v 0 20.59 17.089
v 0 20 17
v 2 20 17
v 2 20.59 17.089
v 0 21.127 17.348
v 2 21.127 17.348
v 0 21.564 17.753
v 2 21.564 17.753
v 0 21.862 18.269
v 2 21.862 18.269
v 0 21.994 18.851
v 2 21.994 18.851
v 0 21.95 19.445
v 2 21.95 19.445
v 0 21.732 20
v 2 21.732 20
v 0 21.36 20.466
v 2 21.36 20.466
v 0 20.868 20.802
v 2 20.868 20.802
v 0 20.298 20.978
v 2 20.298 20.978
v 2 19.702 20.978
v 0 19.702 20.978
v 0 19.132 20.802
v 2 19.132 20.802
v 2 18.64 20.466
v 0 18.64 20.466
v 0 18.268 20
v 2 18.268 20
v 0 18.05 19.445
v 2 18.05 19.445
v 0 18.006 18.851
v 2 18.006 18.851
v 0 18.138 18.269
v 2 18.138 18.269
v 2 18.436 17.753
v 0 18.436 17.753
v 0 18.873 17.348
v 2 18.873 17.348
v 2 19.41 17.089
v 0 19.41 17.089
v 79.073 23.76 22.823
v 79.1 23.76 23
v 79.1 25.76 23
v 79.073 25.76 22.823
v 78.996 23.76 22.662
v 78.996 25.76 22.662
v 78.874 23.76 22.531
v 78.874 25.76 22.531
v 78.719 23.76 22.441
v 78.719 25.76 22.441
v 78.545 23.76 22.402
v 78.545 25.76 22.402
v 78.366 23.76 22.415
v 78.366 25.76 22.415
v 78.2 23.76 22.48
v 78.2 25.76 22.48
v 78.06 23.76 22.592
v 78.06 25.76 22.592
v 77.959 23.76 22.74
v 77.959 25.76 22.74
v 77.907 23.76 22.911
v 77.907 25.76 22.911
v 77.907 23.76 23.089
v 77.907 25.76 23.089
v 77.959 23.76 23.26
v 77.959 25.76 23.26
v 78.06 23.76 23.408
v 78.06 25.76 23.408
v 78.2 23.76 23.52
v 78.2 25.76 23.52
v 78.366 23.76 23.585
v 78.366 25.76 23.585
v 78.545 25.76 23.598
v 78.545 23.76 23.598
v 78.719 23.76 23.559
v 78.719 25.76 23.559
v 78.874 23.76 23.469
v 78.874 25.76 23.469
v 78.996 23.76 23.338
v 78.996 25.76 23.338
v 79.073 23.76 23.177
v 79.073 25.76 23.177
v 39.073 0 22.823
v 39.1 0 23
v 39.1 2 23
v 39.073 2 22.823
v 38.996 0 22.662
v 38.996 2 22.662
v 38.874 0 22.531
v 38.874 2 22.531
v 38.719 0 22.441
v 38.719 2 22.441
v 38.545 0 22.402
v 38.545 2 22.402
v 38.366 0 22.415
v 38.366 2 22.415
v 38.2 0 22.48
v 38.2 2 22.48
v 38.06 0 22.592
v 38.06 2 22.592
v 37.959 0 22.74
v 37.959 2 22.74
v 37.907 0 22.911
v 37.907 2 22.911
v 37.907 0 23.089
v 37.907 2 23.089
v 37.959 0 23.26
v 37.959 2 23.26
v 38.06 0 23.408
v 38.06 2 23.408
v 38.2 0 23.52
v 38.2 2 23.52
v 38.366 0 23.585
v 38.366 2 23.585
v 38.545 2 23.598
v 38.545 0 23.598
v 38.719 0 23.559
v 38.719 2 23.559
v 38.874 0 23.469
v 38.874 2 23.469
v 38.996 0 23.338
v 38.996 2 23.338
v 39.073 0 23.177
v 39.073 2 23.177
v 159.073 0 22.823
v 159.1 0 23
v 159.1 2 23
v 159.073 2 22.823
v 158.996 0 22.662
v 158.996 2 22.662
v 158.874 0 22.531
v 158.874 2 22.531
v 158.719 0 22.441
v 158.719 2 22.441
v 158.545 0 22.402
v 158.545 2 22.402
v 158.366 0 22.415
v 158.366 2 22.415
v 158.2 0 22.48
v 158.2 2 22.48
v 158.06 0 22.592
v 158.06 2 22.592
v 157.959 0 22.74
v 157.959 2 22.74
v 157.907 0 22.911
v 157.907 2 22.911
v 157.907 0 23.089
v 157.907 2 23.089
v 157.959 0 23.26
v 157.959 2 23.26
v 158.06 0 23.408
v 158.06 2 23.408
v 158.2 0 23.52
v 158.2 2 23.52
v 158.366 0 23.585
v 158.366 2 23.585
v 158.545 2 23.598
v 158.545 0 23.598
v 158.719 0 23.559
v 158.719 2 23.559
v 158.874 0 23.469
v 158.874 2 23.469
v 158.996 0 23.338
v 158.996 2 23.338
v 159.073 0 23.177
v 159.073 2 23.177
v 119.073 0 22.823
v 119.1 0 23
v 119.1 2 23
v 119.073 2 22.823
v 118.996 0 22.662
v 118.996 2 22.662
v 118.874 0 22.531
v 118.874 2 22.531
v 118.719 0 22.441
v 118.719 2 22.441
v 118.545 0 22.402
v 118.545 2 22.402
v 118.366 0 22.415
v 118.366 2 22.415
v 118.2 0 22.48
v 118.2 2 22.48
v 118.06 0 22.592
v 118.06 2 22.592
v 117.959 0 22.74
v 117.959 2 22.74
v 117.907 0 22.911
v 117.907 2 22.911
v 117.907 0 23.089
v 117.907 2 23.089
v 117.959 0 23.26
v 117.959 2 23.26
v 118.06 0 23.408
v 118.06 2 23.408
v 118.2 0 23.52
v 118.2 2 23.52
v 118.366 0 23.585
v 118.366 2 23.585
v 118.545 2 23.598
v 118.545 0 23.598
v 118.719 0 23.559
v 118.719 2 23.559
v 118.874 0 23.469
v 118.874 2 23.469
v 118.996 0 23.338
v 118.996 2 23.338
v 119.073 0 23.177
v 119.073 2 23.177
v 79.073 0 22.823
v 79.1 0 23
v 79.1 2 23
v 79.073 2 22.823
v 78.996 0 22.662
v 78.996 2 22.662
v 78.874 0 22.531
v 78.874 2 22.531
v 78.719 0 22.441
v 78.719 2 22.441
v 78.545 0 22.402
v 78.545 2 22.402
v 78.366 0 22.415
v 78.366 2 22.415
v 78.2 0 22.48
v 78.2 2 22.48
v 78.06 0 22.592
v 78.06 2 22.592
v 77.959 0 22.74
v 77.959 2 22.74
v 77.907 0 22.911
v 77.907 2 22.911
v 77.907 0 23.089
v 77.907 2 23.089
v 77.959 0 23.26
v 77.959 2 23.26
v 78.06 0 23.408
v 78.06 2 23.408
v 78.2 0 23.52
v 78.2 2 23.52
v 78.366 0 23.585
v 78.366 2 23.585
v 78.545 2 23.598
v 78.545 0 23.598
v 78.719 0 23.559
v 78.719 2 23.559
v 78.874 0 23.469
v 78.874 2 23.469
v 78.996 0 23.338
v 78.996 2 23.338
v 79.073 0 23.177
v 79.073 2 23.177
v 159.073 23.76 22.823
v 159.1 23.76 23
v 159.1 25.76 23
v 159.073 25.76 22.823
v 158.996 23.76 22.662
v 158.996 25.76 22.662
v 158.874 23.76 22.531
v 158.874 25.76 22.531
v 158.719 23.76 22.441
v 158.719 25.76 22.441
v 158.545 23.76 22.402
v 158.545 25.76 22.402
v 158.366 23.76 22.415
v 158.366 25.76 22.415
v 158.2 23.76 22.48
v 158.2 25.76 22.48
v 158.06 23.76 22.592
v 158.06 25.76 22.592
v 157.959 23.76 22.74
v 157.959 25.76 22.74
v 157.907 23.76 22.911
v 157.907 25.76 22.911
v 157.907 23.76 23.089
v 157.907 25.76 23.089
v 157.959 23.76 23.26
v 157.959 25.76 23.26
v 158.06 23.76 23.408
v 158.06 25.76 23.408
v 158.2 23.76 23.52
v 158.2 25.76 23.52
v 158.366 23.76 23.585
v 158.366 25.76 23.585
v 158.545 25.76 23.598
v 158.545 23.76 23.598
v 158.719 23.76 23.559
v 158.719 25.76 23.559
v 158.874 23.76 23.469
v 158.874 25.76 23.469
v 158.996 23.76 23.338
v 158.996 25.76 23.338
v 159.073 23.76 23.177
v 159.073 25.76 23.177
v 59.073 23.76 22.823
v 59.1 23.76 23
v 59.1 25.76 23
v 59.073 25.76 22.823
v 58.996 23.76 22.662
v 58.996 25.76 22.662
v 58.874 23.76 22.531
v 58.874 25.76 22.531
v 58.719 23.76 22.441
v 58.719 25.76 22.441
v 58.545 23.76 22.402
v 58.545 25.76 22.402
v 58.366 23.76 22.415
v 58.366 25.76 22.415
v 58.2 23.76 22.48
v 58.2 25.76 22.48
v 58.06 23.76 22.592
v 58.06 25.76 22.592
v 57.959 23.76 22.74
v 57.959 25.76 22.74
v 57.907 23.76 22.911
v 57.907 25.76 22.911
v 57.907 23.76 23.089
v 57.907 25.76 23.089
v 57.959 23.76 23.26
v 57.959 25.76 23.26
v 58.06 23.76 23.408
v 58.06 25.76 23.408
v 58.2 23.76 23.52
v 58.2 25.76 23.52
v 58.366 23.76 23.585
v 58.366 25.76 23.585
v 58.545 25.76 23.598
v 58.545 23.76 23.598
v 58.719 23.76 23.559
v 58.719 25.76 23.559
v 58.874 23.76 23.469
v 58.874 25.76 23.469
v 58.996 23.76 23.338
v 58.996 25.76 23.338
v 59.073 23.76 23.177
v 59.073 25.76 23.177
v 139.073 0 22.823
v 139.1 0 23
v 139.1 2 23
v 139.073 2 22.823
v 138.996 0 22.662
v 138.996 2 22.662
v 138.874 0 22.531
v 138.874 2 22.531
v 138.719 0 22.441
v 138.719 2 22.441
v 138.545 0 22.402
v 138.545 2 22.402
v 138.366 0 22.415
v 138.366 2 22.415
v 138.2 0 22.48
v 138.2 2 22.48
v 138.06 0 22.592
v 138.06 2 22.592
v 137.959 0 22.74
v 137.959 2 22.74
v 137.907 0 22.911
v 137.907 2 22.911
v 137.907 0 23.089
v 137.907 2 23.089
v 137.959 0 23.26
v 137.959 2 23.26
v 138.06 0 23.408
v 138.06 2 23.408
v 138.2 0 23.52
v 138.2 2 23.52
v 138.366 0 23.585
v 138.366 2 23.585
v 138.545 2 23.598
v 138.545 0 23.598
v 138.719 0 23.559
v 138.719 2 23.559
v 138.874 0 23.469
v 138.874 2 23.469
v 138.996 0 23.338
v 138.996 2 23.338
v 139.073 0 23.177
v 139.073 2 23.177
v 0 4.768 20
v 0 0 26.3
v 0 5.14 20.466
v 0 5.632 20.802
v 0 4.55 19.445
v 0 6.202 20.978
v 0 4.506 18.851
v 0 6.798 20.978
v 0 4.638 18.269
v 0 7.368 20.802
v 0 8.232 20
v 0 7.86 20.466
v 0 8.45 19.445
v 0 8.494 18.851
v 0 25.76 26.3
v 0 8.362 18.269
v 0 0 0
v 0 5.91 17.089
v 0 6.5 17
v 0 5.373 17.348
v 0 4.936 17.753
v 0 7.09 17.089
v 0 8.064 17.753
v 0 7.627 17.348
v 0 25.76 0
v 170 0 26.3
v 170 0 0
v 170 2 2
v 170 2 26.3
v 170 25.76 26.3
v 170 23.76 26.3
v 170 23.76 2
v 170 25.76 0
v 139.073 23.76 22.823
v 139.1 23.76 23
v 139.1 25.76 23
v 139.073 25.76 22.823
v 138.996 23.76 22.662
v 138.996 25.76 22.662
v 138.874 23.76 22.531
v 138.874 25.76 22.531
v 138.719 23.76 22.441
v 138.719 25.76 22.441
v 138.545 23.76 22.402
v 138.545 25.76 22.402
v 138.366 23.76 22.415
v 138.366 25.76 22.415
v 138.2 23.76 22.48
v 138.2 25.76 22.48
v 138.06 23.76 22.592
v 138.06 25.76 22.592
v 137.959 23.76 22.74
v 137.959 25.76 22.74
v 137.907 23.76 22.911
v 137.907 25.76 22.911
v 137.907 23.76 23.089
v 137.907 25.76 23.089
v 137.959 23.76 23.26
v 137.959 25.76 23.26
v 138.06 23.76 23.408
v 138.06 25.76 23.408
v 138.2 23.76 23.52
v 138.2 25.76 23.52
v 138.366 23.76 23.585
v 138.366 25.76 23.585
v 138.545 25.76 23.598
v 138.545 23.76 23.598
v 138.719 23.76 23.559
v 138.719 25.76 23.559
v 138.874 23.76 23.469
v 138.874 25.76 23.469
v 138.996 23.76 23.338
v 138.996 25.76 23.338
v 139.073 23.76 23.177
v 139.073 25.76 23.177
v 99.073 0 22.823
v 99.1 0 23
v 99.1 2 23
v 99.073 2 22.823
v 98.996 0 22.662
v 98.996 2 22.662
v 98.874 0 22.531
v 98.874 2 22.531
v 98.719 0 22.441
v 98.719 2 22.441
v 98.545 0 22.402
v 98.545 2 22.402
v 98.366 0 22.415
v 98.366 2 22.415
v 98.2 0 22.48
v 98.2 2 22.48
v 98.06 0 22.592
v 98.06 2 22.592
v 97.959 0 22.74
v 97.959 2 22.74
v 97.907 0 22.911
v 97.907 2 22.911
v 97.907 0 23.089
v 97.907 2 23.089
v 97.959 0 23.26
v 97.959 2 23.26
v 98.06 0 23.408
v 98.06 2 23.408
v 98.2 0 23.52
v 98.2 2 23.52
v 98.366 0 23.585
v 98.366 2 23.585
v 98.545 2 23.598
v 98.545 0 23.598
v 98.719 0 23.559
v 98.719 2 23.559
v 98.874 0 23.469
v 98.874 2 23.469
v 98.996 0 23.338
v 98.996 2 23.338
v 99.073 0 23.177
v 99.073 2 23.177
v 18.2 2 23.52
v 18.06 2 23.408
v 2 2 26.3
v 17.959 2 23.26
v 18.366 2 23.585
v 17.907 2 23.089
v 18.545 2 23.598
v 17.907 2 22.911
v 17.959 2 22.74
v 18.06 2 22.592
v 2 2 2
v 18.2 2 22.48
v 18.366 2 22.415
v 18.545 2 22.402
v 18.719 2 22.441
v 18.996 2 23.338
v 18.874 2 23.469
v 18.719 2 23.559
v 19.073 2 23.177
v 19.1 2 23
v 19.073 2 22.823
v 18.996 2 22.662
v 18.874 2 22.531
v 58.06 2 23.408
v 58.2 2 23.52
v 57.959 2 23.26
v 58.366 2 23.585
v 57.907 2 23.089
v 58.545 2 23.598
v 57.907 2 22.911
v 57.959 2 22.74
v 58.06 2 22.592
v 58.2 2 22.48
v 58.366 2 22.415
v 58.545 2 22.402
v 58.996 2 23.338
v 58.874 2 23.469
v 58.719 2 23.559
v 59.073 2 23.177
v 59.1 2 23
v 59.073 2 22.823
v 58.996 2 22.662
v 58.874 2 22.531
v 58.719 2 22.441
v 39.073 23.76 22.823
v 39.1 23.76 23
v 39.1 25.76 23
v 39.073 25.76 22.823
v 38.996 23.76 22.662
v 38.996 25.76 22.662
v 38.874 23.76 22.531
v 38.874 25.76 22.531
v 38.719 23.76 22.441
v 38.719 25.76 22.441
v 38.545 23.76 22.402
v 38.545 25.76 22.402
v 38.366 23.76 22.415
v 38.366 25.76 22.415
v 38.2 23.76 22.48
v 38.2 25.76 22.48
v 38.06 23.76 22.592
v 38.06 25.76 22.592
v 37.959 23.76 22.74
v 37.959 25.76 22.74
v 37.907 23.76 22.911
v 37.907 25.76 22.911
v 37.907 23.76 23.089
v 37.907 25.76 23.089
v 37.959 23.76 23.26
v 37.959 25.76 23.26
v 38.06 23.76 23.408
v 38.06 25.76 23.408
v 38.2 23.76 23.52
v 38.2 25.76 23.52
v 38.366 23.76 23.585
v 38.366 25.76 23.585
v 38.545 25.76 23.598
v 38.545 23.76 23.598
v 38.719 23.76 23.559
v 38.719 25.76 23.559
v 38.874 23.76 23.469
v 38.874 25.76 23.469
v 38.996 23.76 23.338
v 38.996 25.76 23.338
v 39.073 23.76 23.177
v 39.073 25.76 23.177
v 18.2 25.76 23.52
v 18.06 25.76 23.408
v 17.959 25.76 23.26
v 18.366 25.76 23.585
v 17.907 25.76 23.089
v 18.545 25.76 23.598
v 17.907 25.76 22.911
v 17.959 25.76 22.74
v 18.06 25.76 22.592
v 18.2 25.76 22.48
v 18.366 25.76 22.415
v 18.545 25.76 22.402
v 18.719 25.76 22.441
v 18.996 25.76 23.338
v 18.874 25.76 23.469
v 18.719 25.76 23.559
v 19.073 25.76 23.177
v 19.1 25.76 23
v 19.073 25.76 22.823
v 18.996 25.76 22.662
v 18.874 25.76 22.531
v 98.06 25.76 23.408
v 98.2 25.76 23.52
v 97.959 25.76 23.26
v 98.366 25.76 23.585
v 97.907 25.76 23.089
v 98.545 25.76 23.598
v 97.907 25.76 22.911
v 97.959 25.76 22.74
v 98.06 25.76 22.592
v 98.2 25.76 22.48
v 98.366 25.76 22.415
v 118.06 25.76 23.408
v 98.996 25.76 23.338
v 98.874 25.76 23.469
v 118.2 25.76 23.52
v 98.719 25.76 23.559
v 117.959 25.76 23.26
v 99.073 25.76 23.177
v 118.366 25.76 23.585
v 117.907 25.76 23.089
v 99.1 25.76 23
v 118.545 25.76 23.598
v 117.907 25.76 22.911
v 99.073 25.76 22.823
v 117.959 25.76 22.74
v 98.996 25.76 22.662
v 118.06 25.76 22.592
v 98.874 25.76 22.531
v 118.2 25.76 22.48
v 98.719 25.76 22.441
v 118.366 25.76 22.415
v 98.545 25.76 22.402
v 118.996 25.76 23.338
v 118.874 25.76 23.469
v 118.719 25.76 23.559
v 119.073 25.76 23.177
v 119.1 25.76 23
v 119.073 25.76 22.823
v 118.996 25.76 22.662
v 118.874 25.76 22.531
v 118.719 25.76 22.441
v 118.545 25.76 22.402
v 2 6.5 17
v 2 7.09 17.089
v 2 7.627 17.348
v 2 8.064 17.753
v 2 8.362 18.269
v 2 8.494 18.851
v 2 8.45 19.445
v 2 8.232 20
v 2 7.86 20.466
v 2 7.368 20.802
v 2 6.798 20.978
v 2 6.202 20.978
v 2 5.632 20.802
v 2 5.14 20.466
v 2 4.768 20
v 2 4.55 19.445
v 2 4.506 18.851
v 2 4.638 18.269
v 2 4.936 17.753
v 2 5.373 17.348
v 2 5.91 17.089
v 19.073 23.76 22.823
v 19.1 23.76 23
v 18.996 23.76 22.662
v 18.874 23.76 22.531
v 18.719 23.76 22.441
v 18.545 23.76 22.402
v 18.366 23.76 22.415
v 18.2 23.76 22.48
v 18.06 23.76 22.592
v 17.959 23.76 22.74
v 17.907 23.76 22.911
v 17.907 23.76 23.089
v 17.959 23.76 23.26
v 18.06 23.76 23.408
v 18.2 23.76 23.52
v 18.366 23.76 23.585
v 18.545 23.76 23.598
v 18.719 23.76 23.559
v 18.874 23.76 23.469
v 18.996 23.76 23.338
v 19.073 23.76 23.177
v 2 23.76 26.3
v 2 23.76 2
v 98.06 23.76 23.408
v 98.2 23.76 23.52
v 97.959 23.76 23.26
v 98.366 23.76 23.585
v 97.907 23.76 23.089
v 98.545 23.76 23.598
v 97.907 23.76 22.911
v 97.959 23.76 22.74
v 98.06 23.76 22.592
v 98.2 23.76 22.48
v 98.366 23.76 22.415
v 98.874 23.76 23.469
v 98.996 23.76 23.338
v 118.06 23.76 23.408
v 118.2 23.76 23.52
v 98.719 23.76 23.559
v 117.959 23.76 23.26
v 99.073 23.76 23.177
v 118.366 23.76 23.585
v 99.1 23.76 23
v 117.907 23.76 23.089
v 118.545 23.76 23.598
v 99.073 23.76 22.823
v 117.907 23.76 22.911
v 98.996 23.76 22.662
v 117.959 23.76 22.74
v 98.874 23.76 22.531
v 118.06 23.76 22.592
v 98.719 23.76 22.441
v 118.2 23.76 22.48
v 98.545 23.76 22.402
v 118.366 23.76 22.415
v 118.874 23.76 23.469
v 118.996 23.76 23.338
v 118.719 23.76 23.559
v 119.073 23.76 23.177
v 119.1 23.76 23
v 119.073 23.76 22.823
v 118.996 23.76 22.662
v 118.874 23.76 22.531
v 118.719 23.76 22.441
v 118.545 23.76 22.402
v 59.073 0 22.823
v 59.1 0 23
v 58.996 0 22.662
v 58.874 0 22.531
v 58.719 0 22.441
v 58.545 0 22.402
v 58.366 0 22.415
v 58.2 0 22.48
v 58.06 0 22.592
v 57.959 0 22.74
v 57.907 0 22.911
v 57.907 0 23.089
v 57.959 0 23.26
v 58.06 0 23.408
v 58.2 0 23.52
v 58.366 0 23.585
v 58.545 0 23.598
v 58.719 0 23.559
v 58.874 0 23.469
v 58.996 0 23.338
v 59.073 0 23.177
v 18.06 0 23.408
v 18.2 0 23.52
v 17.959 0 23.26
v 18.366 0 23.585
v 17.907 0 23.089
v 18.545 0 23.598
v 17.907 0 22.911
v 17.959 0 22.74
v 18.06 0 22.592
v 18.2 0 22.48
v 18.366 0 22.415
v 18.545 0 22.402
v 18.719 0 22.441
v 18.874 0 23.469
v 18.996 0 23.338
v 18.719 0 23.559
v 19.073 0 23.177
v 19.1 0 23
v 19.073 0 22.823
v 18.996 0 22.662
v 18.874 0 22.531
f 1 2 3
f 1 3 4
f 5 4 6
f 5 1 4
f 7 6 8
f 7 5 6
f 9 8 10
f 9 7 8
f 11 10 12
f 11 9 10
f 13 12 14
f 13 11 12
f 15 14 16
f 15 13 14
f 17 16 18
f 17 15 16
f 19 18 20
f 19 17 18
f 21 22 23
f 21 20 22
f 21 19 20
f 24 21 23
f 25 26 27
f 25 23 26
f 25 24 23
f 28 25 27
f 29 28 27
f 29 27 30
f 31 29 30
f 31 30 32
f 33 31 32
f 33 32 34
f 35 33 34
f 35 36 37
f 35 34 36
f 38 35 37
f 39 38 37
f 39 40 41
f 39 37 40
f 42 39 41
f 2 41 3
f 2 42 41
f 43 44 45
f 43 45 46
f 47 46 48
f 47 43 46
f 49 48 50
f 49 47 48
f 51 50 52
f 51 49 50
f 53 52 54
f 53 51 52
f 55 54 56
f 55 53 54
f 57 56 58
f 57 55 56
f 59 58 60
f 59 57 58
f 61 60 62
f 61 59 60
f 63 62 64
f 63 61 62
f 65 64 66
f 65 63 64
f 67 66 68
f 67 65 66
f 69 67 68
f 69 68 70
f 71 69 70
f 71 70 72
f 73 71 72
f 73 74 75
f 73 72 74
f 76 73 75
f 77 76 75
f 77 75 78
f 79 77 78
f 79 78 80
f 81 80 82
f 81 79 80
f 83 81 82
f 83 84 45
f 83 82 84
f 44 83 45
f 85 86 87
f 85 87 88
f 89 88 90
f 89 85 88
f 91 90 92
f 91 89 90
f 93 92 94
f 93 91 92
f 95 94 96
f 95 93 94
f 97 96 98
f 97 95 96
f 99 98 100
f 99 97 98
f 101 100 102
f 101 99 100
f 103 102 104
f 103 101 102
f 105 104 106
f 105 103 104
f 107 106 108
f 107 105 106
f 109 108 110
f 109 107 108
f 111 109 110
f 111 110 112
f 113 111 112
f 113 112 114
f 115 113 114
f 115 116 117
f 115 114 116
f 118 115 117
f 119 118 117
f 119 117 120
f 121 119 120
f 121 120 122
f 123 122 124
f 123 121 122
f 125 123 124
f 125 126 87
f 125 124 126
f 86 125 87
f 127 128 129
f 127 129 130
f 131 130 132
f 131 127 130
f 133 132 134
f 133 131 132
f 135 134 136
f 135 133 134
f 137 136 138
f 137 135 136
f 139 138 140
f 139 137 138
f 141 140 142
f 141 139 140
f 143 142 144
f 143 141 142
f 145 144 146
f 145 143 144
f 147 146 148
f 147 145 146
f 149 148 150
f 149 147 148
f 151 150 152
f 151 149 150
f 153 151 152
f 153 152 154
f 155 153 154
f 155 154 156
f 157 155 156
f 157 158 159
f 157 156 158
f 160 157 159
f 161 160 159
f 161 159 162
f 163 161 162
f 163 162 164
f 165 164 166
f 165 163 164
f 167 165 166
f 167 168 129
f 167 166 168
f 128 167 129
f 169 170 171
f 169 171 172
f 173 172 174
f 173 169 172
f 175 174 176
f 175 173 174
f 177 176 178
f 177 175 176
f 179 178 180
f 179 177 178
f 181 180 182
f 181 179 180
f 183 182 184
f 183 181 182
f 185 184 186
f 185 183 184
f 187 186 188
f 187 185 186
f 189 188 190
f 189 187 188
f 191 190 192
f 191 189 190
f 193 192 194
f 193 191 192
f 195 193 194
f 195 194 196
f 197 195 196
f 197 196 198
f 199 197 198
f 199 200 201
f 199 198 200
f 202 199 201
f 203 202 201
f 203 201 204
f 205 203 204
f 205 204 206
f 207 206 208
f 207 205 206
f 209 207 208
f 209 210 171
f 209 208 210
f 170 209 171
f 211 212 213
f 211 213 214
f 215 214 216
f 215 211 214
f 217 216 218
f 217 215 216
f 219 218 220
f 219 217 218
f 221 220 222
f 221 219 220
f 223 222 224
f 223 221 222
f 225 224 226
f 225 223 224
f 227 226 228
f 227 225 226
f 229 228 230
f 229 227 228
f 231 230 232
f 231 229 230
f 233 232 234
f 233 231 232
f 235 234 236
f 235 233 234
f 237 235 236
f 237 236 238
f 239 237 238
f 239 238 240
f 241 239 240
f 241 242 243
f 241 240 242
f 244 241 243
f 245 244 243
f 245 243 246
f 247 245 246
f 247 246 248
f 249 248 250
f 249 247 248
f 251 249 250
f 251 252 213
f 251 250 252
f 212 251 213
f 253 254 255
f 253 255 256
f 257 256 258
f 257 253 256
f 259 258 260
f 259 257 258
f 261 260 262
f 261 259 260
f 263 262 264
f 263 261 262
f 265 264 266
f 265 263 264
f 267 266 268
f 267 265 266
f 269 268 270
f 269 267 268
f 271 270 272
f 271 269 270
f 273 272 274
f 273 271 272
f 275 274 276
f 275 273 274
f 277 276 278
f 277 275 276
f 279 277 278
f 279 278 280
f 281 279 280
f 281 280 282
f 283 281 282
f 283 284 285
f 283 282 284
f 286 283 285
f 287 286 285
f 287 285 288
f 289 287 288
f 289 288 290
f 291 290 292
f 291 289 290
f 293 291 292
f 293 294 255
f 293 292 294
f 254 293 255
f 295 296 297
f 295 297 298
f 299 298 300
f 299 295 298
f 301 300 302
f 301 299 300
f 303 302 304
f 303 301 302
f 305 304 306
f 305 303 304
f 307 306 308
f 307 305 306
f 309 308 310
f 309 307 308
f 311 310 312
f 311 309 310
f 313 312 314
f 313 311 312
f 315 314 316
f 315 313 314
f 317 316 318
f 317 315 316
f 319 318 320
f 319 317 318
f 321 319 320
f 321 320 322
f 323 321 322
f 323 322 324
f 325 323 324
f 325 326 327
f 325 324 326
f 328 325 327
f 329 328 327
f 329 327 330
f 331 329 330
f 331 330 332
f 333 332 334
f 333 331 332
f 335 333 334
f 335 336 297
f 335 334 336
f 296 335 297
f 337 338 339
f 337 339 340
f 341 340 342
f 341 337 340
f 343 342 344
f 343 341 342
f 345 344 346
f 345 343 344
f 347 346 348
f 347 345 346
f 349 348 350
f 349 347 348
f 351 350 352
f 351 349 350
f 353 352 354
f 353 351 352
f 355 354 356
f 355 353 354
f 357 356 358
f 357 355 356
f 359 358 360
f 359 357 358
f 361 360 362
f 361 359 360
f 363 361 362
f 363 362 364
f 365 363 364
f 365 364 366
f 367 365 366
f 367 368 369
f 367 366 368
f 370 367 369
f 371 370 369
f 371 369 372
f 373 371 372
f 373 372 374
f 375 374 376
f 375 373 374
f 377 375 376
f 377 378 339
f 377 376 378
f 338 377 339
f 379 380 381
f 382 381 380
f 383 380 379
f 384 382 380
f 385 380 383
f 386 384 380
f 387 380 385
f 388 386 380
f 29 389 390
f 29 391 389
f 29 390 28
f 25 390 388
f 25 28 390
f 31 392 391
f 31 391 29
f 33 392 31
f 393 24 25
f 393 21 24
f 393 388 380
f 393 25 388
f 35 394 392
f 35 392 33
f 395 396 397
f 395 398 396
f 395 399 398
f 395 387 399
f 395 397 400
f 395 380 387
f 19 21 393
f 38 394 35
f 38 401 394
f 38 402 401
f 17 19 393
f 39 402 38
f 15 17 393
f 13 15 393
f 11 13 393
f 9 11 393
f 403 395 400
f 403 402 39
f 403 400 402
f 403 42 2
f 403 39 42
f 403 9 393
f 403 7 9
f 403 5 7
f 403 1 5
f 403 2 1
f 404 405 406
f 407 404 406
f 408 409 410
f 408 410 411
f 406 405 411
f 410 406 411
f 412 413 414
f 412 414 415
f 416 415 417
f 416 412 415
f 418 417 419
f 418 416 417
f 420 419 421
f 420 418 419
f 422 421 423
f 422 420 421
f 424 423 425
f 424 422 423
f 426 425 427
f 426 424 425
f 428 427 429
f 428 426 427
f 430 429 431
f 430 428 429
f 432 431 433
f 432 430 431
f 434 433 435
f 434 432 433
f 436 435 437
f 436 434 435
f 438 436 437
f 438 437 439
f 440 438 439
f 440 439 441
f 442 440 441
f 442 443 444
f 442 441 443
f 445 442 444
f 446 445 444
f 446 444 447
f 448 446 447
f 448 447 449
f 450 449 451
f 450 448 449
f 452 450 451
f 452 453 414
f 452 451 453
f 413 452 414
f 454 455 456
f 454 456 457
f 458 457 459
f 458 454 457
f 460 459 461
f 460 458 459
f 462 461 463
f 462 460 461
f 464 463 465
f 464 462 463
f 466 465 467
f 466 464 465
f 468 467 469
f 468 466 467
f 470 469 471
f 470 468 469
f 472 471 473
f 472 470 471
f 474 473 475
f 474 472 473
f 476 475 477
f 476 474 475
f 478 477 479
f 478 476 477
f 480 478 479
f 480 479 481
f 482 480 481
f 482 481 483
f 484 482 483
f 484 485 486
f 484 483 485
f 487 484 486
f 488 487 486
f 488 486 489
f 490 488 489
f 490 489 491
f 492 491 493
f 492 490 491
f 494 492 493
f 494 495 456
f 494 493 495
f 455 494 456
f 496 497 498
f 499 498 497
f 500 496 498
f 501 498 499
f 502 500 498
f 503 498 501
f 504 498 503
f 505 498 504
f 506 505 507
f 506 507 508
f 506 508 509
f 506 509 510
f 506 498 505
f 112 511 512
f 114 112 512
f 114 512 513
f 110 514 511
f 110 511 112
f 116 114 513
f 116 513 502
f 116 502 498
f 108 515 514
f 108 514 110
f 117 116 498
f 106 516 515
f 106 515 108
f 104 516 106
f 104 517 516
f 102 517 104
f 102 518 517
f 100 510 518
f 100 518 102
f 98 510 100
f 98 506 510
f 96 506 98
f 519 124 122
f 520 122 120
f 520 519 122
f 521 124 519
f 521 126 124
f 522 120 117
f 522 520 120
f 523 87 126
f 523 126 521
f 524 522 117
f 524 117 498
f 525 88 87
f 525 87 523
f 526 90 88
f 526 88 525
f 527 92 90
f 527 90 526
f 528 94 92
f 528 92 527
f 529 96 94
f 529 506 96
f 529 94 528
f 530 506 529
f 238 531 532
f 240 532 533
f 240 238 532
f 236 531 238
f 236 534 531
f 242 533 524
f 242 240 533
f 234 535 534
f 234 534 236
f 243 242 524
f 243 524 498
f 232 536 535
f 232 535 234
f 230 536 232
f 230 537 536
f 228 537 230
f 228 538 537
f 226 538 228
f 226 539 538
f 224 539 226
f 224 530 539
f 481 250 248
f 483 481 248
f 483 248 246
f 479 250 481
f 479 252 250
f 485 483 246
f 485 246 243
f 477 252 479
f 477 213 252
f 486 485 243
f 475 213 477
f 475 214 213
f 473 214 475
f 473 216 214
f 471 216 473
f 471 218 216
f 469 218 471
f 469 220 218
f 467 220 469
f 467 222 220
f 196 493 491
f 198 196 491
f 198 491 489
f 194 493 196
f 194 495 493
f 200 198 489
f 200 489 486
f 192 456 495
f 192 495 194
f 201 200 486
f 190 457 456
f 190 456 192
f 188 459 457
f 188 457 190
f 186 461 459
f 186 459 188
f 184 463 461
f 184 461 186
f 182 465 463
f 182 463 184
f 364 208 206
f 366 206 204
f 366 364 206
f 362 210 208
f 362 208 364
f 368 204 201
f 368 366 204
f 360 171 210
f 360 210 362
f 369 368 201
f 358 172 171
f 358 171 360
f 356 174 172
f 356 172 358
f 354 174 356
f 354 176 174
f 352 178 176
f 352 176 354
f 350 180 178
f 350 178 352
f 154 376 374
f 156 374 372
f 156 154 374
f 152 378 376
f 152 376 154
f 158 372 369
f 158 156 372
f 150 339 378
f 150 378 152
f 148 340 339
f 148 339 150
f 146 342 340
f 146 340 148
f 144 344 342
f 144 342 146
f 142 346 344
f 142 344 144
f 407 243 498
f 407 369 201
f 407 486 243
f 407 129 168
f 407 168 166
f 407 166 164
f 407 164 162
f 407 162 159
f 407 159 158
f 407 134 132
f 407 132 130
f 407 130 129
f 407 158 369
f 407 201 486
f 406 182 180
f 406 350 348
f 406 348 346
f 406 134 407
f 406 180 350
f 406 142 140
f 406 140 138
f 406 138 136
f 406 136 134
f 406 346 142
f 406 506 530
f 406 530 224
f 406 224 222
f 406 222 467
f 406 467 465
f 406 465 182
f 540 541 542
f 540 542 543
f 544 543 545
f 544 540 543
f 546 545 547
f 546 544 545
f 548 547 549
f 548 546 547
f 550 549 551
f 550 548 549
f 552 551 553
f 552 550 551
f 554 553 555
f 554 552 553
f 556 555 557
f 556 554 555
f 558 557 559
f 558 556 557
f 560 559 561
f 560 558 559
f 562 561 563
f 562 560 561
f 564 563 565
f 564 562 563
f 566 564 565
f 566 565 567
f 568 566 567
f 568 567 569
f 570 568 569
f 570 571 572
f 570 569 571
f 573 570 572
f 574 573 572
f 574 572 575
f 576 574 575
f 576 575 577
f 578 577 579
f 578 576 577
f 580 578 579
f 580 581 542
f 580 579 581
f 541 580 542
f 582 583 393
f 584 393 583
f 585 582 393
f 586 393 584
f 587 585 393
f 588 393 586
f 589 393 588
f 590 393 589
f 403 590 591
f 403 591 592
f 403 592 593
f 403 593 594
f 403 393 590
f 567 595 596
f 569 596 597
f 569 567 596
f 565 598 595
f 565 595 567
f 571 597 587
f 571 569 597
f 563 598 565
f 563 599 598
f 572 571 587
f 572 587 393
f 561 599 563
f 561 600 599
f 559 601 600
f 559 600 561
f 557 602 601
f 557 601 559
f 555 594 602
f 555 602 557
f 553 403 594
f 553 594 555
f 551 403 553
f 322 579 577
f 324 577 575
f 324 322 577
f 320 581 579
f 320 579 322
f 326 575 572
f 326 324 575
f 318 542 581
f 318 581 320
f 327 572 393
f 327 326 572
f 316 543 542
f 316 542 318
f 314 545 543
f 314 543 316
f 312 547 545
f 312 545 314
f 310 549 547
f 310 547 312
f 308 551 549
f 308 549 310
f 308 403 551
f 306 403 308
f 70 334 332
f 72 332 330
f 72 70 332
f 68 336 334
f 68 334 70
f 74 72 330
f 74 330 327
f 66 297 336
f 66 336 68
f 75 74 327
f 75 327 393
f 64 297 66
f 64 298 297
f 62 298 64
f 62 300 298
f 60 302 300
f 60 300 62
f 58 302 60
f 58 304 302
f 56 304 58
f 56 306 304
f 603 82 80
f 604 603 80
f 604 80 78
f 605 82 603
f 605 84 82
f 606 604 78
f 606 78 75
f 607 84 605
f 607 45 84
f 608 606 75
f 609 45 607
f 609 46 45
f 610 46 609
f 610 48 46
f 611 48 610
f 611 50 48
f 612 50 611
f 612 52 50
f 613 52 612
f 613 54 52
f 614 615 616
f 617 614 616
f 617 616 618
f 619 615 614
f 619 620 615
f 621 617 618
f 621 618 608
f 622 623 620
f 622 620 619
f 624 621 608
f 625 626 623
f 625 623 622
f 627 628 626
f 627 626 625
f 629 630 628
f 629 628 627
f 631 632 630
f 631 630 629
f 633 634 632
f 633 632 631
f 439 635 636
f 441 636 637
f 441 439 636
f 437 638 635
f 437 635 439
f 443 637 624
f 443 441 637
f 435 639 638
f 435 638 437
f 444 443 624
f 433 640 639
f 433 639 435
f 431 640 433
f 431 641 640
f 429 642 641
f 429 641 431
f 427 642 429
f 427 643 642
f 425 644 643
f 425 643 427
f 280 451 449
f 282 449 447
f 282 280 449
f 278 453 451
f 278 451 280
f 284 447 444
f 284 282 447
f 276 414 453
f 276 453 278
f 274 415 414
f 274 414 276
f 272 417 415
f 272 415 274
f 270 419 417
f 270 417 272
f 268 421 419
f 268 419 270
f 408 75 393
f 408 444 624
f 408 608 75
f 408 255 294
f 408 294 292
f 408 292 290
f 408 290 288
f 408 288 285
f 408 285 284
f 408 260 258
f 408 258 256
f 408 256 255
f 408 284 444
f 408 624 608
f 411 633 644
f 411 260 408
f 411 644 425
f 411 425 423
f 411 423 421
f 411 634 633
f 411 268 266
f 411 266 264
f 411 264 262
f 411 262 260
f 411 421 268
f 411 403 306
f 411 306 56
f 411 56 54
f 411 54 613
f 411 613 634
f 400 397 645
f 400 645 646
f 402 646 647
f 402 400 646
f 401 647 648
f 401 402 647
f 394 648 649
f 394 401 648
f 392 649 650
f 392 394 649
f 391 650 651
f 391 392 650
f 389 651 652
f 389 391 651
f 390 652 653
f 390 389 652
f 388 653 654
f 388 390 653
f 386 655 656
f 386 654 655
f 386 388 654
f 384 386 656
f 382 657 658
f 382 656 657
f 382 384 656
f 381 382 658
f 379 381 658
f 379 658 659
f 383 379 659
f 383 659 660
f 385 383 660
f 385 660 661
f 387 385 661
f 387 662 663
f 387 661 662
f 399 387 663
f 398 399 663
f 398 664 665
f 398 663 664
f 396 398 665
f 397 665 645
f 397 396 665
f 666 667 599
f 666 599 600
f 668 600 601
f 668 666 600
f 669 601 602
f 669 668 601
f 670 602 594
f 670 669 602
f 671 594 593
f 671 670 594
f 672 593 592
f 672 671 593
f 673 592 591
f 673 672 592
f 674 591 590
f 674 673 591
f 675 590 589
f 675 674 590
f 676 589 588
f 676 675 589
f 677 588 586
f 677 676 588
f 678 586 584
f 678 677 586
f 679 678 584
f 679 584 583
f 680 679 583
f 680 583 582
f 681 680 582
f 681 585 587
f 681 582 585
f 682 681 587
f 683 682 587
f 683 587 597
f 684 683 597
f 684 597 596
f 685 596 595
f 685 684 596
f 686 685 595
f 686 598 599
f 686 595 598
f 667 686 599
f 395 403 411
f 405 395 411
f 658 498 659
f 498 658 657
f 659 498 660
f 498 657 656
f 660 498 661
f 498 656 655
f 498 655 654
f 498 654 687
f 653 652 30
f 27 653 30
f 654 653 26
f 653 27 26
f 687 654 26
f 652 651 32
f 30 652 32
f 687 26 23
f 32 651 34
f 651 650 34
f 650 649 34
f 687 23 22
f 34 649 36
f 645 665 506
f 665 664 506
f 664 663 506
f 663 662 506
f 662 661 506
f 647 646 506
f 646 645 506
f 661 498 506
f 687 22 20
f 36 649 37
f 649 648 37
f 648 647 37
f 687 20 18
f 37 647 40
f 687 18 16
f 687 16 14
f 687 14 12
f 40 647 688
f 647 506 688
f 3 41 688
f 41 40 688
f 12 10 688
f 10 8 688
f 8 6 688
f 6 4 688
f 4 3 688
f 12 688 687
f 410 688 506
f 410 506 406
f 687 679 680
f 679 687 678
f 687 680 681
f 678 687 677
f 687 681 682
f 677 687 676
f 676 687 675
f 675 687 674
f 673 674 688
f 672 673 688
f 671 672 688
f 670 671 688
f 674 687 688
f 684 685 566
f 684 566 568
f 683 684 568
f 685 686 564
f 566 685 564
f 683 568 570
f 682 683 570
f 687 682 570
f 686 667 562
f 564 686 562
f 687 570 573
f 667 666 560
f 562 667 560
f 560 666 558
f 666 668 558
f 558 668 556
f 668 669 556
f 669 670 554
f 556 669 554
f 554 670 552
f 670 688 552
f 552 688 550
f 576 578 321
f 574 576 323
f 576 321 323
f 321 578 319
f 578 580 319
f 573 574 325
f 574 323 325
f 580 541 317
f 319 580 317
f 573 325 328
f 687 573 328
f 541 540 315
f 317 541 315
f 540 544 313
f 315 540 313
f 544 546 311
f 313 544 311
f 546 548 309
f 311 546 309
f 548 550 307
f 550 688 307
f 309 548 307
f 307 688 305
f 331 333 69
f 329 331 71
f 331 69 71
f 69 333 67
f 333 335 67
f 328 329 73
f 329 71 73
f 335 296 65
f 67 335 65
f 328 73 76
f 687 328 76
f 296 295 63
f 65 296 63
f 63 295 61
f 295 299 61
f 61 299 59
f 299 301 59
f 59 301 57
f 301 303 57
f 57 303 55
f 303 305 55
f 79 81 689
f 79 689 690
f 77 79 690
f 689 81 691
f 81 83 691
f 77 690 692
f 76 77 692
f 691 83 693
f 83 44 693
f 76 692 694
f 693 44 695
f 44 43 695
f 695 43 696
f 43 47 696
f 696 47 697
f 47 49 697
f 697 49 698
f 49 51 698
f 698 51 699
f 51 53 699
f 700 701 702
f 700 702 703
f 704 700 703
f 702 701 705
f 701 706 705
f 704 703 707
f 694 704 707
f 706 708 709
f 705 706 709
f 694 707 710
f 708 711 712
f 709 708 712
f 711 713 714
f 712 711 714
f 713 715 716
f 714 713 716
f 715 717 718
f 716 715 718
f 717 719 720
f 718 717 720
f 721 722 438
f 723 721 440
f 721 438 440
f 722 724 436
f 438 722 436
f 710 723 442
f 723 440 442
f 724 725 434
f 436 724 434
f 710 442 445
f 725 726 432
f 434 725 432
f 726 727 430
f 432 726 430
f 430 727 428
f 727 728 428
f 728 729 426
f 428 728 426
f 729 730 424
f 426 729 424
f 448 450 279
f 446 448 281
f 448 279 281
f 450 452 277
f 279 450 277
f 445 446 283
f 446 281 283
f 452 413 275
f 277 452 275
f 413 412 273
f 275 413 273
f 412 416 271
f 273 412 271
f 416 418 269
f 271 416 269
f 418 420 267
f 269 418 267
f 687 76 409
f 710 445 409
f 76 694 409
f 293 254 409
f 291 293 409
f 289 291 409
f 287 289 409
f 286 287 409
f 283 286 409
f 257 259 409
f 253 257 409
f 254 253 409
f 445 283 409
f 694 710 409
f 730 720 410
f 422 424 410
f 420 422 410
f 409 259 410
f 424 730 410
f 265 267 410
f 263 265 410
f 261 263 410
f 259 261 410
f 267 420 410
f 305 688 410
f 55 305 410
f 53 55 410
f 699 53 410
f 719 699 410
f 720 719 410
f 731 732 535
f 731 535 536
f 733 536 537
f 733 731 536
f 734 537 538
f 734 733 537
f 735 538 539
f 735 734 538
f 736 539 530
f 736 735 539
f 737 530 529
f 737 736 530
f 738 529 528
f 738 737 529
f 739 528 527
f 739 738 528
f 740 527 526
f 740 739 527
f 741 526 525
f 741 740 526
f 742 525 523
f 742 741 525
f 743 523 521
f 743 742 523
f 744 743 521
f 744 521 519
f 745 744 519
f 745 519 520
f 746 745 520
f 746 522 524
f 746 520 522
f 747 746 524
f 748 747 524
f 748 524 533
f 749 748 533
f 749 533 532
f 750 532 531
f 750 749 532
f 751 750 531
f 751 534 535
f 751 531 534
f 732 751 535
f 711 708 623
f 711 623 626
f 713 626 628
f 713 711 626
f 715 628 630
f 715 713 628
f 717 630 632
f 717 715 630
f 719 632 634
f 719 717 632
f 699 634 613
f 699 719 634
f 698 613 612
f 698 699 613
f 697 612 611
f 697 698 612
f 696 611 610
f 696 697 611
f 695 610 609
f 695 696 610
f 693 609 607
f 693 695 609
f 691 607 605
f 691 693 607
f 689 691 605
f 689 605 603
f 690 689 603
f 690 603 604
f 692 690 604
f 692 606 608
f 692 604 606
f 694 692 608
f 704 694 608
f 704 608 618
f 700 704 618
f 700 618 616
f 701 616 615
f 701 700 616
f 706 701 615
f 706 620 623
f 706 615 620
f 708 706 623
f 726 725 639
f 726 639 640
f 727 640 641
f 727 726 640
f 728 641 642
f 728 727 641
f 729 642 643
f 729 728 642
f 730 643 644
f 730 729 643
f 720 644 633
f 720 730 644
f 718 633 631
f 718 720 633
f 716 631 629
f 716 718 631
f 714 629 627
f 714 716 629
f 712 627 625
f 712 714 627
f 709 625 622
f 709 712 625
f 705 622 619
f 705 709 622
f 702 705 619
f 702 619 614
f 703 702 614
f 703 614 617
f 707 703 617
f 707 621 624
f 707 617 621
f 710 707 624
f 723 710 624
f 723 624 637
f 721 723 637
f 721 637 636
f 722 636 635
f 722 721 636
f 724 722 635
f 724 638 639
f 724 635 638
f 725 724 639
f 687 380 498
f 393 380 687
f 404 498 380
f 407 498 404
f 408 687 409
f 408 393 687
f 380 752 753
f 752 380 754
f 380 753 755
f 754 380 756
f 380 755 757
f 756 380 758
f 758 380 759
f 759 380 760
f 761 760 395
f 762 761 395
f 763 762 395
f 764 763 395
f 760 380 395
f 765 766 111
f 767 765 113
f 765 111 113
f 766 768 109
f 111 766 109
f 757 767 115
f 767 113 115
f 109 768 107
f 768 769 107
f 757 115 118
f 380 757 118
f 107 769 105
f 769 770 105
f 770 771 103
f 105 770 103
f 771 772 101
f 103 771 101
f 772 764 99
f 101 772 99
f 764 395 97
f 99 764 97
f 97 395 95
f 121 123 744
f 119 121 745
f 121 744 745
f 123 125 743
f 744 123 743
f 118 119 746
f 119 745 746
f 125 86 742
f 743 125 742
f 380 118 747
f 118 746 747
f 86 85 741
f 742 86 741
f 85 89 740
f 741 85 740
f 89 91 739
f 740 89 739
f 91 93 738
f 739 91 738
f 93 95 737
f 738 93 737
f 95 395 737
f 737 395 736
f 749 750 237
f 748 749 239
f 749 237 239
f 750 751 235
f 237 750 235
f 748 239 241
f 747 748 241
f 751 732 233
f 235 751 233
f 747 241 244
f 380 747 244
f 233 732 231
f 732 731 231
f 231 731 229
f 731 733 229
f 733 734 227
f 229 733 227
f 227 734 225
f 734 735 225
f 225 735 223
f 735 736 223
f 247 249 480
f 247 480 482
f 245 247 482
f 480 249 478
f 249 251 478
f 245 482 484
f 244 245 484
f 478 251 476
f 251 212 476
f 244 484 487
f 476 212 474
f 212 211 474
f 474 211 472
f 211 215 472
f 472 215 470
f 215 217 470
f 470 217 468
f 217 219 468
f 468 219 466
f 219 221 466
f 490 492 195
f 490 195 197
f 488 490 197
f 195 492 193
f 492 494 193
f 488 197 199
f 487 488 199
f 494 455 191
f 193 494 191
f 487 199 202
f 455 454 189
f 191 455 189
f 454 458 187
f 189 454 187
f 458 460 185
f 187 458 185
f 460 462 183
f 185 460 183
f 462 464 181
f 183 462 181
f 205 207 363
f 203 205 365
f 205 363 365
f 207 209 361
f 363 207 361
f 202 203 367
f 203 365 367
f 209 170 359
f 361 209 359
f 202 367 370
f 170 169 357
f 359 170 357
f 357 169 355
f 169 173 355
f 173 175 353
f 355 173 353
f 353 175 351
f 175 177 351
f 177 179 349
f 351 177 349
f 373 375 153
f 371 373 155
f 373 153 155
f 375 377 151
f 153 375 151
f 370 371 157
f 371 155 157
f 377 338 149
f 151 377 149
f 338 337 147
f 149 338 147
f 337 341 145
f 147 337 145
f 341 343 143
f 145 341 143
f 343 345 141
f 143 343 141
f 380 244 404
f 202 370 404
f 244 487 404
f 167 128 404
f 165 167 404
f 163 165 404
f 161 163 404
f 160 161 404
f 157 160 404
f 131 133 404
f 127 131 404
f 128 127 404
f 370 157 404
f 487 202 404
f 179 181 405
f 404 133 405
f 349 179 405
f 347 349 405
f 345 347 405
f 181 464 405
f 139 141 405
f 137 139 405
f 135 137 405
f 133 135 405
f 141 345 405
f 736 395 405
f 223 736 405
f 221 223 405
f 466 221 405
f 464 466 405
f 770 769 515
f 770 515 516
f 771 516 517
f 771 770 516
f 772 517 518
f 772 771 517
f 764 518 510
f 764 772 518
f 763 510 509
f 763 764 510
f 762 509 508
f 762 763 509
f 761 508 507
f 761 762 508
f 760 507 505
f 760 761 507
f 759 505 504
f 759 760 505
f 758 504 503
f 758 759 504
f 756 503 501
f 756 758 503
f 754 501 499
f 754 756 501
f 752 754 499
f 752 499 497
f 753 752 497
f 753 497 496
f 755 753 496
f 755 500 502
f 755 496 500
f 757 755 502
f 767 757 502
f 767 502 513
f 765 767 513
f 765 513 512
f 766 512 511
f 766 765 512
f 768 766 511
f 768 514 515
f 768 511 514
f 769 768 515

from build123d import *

# Parameters (mm, degrees)
CYLINDER003_R     = 2
CYLINDER003_DEPTH = 10
ARRAY001_Y_COUNT  = 2
ARRAY001_Y_PITCH  = 13.5
CYLINDER002_R     = 0.6
CYLINDER002_DEPTH = 100
ARRAY002_X_COUNT  = 8
ARRAY002_X_PITCH  = 20
BOX001_W          = 170
BOX001_H          = 21.76
BOX001_DEPTH      = 26.3
BOX_W             = 170
BOX_H             = 25.76
BOX_DEPTH         = 26.3


with BuildPart() as array001:
    # Cylinder003 → Cylinder003 (new body)
    with BuildSketch(Plane(origin=(-4, 6.5, 19), x_dir=(0, 0, -1), z_dir=(1, 0, 0))):
        Circle(CYLINDER003_R)
    extrude(amount=CYLINDER003_DEPTH)

    # Array001 Y: Array001 ×2


with BuildPart() as array001_1:
    add(array001.part)
    with Locations(*[(0, i * ARRAY001_Y_PITCH, 0) for i in range(1, ARRAY001_Y_COUNT)]):
        add(array001.part)


with BuildPart() as array002:
    # Cylinder002 → Cylinder002 (new body)
    with BuildSketch(Plane(origin=(18.5, -32.5, 23), x_dir=(1, 0, 0), z_dir=(0, 1, 0))):
        Circle(CYLINDER002_R)
    extrude(amount=CYLINDER002_DEPTH)

    # Array002 X: Array002 ×8


with BuildPart() as array002_1:
    add(array002.part)
    with Locations(*[(i * ARRAY002_X_PITCH, 0, 0) for i in range(1, ARRAY002_X_COUNT)]):
        add(array002.part)


with BuildPart() as fusion:
    # Box001 → Box001 (new body)
    with BuildSketch(Plane(origin=(2, 2, 2), x_dir=(1, 0, 0), z_dir=(0, 0, 1))):
        with Locations((85, 10.88)):
            Rectangle(BOX001_W, BOX001_H)
    extrude(amount=BOX001_DEPTH)

    # Fusion: union Array001, Array002
    add(array001_1.part)
    add(array002_1.part)


with BuildPart() as cut001:
    # Box → Box (new body)
    with BuildSketch(Plane.XY):
        with Locations((85, 12.88)):
            Rectangle(BOX_W, BOX_H)
    extrude(amount=BOX_DEPTH)

    # Cut001: cut Fusion
    add(fusion.part, mode=Mode.SUBTRACT)


solid = cut001.part
